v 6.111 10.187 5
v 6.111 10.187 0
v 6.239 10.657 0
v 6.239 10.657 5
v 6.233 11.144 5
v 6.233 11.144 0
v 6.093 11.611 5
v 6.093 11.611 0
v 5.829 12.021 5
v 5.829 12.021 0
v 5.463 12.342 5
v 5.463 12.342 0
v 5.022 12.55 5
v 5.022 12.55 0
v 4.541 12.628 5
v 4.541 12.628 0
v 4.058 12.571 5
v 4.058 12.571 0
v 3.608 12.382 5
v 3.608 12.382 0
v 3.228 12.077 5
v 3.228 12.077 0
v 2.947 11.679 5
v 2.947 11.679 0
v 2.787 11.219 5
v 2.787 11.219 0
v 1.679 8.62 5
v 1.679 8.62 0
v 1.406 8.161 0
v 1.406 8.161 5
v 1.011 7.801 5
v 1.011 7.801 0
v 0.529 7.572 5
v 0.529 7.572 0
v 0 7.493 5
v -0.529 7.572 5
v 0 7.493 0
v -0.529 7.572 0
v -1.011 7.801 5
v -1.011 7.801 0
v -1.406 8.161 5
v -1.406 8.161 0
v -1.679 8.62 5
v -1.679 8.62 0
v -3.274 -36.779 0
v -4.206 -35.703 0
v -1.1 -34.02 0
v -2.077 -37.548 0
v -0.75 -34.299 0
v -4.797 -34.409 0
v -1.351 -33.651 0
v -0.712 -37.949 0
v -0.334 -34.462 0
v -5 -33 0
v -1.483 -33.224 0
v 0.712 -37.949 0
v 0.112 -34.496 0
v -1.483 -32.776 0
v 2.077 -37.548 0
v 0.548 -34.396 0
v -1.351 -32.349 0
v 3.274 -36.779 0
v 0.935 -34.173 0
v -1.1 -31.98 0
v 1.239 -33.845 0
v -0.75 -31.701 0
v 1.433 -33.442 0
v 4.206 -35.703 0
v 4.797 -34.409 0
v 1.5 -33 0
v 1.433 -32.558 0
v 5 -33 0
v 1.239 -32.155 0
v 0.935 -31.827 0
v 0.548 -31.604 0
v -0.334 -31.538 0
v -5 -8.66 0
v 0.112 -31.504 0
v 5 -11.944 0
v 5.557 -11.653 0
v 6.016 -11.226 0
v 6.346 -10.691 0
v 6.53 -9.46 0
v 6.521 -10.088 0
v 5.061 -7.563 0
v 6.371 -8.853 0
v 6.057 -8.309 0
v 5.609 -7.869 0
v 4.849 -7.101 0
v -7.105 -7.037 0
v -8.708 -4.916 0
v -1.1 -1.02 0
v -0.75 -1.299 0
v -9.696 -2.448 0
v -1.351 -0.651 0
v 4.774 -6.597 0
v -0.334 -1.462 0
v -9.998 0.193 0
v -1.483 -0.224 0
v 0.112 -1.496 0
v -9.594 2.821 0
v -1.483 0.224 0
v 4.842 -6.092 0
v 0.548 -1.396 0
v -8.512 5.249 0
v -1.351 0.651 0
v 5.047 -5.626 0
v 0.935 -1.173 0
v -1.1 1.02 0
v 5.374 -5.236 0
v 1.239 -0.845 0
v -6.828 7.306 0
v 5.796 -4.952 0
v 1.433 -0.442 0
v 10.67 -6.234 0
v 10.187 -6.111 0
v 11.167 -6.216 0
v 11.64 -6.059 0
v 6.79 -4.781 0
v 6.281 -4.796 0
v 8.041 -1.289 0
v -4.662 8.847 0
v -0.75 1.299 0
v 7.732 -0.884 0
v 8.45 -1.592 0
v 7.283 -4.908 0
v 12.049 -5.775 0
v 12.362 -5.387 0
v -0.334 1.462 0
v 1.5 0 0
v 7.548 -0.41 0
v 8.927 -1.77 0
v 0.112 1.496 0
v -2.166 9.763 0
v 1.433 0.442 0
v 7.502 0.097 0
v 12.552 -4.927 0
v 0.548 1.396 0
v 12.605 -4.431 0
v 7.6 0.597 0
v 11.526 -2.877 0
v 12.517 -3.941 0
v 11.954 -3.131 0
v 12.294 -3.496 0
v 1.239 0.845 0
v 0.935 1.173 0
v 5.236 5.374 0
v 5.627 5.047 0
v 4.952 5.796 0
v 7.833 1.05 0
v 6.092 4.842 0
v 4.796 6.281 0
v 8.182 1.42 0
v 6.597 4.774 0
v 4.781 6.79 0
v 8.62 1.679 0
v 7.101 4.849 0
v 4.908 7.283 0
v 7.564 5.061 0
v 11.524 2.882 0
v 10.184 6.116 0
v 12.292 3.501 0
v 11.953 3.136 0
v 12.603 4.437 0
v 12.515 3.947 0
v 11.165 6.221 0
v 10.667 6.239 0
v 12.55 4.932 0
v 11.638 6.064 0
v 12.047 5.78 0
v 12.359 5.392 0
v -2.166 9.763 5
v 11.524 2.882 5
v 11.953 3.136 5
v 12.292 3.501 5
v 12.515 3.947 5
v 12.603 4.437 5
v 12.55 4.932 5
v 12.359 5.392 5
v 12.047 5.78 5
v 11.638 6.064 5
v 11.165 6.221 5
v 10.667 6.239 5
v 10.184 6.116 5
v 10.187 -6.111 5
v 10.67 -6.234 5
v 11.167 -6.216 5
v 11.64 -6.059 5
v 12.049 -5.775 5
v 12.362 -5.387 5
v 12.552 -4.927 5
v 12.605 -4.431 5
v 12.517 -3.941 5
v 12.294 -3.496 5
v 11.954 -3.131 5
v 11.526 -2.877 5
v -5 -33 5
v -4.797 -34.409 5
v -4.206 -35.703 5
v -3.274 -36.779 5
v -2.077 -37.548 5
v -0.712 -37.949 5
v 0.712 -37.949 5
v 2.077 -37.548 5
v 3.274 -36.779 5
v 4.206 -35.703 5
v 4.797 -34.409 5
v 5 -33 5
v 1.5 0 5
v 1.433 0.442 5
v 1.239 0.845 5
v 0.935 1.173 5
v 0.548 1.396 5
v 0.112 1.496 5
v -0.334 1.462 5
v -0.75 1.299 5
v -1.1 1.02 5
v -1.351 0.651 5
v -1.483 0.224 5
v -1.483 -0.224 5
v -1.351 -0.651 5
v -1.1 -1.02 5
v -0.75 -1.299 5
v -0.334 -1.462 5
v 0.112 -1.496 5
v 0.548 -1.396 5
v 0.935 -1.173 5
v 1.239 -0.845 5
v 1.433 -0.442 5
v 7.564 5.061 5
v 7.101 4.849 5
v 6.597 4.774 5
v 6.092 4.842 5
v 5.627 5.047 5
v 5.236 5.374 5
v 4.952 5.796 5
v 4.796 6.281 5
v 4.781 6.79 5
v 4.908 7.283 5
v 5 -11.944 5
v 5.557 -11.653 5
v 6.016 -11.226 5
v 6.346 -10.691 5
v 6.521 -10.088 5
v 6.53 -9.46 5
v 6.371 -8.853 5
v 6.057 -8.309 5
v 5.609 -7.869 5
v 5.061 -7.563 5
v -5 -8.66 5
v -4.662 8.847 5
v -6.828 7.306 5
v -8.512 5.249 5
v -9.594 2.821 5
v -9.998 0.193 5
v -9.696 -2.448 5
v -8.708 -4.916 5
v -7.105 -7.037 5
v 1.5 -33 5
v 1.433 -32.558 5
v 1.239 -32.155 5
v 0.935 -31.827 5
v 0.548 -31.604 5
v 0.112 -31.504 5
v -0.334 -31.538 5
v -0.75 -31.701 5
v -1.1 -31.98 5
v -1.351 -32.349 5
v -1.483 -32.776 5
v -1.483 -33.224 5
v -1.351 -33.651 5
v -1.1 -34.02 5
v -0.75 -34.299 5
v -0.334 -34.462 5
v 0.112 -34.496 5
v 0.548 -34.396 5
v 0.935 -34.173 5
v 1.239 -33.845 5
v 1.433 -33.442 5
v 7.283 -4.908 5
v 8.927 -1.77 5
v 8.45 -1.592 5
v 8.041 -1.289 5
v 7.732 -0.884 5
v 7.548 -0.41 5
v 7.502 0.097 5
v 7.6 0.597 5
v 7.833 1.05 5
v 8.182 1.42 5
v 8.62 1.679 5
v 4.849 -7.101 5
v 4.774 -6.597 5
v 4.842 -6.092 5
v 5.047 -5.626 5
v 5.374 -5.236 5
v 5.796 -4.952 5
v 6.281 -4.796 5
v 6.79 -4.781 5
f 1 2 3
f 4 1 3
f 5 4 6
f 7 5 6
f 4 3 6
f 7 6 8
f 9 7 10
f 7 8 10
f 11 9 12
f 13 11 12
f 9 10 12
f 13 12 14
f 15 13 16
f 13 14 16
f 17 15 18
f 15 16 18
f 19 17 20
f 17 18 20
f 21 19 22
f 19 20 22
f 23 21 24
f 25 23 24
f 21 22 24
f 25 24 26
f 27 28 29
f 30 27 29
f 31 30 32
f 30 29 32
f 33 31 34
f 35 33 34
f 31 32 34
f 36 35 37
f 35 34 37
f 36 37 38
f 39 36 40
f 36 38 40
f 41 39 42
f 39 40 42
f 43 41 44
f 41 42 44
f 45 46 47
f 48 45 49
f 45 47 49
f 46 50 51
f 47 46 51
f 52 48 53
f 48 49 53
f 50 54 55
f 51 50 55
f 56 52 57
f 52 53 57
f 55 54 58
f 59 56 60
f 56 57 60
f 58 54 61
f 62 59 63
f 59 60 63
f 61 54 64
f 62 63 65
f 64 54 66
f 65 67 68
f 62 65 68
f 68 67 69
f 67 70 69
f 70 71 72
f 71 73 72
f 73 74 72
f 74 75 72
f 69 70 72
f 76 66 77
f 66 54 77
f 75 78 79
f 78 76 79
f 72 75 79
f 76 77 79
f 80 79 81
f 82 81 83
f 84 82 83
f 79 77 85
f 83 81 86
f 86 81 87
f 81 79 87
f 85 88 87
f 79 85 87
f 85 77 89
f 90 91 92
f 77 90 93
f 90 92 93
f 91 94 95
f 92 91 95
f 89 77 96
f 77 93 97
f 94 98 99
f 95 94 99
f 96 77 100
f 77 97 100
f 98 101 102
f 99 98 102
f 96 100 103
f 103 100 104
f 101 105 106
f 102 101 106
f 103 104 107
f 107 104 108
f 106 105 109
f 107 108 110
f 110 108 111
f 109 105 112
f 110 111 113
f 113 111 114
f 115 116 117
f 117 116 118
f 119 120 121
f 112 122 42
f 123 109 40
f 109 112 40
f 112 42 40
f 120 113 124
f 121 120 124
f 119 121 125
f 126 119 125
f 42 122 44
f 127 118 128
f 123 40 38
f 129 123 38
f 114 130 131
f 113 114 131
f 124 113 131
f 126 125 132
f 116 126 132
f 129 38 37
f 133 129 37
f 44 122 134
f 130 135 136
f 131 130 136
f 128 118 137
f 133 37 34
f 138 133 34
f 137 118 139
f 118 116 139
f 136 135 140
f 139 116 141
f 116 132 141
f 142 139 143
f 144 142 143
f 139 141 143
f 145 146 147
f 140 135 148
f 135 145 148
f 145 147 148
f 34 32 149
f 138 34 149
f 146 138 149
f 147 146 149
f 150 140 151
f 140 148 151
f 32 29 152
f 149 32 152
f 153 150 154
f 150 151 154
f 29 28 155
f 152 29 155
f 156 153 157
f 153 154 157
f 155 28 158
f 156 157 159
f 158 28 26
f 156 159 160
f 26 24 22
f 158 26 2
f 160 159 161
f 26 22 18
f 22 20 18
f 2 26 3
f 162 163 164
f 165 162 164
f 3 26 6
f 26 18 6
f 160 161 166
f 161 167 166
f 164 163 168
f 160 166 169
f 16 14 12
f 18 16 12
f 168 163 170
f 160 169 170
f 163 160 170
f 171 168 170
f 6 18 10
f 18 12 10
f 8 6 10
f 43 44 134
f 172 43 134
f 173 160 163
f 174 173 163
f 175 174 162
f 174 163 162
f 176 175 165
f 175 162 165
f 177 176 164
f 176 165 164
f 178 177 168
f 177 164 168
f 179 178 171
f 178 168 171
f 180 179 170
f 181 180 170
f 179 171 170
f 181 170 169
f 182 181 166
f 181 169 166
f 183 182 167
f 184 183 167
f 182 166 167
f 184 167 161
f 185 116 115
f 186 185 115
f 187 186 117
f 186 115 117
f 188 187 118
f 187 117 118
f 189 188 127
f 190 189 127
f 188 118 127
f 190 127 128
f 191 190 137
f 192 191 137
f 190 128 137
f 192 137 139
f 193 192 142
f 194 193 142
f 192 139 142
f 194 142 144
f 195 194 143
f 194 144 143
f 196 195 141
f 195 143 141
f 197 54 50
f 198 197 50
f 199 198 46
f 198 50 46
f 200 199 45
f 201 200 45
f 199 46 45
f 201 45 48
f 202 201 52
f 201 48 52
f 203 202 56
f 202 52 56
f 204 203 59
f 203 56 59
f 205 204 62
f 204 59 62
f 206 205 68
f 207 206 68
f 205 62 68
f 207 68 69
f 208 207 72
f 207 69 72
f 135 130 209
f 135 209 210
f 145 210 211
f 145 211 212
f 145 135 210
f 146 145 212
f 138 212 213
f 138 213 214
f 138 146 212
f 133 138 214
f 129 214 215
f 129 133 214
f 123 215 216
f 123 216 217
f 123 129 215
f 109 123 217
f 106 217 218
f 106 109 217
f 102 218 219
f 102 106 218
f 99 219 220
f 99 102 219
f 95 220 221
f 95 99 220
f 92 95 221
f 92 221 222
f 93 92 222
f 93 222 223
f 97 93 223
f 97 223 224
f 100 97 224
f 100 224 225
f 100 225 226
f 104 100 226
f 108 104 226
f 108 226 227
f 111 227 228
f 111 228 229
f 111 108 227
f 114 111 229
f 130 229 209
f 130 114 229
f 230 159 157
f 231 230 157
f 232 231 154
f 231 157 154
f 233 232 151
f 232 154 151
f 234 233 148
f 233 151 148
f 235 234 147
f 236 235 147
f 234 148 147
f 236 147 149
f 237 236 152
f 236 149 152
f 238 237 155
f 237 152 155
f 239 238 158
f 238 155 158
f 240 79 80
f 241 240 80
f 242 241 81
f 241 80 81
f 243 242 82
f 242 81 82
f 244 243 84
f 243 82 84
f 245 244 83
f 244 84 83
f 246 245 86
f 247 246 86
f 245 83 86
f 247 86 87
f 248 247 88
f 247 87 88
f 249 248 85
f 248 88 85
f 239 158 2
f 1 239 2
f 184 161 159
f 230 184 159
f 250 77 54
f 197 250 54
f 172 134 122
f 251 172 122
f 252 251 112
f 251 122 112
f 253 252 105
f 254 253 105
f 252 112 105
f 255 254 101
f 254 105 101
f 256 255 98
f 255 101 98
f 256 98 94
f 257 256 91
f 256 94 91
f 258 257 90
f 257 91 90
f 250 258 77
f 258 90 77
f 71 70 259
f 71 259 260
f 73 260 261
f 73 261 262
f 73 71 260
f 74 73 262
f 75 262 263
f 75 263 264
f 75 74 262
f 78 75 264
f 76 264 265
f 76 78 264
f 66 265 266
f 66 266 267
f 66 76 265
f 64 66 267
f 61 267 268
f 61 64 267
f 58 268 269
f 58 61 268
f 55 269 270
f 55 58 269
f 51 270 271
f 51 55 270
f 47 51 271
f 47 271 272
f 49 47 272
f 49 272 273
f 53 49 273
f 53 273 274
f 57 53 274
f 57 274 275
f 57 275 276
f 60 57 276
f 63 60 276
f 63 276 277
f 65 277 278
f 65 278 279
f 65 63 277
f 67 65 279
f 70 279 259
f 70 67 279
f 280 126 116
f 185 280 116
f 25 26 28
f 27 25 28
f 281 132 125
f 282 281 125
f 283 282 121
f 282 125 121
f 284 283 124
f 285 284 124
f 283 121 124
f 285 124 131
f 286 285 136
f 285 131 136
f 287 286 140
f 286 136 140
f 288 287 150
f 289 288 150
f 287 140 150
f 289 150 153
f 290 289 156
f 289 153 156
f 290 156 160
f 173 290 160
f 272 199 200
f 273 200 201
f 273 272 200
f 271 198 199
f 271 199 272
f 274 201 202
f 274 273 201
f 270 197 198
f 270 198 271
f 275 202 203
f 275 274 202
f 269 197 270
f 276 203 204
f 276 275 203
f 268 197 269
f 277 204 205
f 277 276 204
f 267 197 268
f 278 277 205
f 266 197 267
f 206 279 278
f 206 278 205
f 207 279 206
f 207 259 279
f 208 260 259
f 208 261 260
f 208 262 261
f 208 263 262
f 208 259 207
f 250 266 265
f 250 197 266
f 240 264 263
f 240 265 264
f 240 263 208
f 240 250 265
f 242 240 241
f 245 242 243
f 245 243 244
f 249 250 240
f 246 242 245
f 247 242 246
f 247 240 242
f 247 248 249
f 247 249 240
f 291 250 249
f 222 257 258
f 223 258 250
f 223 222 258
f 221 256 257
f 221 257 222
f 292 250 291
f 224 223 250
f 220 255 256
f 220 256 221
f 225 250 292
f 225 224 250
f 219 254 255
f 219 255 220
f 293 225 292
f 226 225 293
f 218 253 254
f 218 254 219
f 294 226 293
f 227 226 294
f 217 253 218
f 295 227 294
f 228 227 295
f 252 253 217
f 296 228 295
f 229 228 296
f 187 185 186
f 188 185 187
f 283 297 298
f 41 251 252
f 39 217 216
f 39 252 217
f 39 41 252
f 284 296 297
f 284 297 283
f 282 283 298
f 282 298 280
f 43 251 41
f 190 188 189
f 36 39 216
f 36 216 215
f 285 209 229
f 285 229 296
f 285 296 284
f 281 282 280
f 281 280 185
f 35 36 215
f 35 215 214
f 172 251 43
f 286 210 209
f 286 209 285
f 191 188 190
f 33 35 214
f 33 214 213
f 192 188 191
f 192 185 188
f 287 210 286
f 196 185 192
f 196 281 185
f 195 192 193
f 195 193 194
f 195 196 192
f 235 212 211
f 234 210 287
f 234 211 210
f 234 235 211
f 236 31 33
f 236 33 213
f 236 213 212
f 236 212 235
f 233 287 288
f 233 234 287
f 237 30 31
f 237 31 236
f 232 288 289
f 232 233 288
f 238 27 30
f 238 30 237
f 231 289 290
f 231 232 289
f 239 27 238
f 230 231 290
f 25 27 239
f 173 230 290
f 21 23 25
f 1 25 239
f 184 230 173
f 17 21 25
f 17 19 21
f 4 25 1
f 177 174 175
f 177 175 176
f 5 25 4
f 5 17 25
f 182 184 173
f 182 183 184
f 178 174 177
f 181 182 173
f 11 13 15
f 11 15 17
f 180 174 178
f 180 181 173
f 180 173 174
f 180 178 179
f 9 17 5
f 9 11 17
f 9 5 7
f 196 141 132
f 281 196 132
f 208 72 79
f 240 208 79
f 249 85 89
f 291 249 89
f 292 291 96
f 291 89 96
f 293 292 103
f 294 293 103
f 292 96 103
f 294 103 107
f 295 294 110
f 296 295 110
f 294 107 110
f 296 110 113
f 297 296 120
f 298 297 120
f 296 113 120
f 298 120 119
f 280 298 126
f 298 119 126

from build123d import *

# Parameters (mm, degrees)
SKETCH2_R           = 1.5
BOSS_EXTRUDE1_DEPTH = 5


with BuildPart() as part:
    # Sketch2 → Boss-Extrude1 (new body)
    with BuildSketch(Plane.XY):
        with BuildLine():
            Line((2.786749194, 11.219281361), (1.679332735, 8.620125122))
            ThreePointArc((1.679332735, 8.620125122), (0, 7.492843349), (-1.679332735, 8.620125122))
            Line((-1.679332735, 8.620125122), (-2.166097038, 9.762582836))
            ThreePointArc((-2.166097038, 9.762582836), (-9.883747584, 1.52037288), (-5, -8.660254038))
            Line((-5, -8.660254038), (-5, -33))
            ThreePointArc((-5, -33), (0, -38), (5, -32.999999999))
            Line((5, -32.999999999), (4.999812723, -11.943549515))
            ThreePointArc((4.999812723, -11.943549515), (6.546655646, -9.774570585), (5.060672488, -7.563451711))
            ThreePointArc((5.060672488, -7.563451711), (5.196669714, -5.419737645), (7.282816493, -4.907881363))
            Line((7.282816493, -4.907881363), (10.186929901, -6.110804524))
            ThreePointArc((10.186929901, -6.110804524), (12.473305355, -5.163446511), (11.525947342, -2.877071058))
            Line((11.525947342, -2.877071058), (8.926791103, -1.769654599))
            ThreePointArc((8.926791103, -1.769654599), (7.507129847, -0.157755799), (8.620125937, 1.679333073))
            Line((8.620125937, 1.679333073), (11.524239345, 2.882256233))
            ThreePointArc((11.524239345, 2.882256233), (12.471253953, 5.168928764), (10.18447198, 6.11567907))
            Line((10.18447198, 6.11567907), (7.56352929, 5.060859756))
            ThreePointArc((7.56352929, 5.060859756), (5.419892956, 5.196791944), (4.907881363, 7.282816493))
            Line((4.907881363, 7.282816493), (6.110804524, 10.186929901))
            ThreePointArc((6.110804524, 10.186929901), (5.022287729, 12.549745986), (2.786749194, 11.219281361))
        make_face()
        with Locations((0, -33)):
            Circle(SKETCH2_R, mode=Mode.SUBTRACT)
        Circle(SKETCH2_R, mode=Mode.SUBTRACT)
    extrude(amount=BOSS_EXTRUDE1_DEPTH)


solid = part.part
